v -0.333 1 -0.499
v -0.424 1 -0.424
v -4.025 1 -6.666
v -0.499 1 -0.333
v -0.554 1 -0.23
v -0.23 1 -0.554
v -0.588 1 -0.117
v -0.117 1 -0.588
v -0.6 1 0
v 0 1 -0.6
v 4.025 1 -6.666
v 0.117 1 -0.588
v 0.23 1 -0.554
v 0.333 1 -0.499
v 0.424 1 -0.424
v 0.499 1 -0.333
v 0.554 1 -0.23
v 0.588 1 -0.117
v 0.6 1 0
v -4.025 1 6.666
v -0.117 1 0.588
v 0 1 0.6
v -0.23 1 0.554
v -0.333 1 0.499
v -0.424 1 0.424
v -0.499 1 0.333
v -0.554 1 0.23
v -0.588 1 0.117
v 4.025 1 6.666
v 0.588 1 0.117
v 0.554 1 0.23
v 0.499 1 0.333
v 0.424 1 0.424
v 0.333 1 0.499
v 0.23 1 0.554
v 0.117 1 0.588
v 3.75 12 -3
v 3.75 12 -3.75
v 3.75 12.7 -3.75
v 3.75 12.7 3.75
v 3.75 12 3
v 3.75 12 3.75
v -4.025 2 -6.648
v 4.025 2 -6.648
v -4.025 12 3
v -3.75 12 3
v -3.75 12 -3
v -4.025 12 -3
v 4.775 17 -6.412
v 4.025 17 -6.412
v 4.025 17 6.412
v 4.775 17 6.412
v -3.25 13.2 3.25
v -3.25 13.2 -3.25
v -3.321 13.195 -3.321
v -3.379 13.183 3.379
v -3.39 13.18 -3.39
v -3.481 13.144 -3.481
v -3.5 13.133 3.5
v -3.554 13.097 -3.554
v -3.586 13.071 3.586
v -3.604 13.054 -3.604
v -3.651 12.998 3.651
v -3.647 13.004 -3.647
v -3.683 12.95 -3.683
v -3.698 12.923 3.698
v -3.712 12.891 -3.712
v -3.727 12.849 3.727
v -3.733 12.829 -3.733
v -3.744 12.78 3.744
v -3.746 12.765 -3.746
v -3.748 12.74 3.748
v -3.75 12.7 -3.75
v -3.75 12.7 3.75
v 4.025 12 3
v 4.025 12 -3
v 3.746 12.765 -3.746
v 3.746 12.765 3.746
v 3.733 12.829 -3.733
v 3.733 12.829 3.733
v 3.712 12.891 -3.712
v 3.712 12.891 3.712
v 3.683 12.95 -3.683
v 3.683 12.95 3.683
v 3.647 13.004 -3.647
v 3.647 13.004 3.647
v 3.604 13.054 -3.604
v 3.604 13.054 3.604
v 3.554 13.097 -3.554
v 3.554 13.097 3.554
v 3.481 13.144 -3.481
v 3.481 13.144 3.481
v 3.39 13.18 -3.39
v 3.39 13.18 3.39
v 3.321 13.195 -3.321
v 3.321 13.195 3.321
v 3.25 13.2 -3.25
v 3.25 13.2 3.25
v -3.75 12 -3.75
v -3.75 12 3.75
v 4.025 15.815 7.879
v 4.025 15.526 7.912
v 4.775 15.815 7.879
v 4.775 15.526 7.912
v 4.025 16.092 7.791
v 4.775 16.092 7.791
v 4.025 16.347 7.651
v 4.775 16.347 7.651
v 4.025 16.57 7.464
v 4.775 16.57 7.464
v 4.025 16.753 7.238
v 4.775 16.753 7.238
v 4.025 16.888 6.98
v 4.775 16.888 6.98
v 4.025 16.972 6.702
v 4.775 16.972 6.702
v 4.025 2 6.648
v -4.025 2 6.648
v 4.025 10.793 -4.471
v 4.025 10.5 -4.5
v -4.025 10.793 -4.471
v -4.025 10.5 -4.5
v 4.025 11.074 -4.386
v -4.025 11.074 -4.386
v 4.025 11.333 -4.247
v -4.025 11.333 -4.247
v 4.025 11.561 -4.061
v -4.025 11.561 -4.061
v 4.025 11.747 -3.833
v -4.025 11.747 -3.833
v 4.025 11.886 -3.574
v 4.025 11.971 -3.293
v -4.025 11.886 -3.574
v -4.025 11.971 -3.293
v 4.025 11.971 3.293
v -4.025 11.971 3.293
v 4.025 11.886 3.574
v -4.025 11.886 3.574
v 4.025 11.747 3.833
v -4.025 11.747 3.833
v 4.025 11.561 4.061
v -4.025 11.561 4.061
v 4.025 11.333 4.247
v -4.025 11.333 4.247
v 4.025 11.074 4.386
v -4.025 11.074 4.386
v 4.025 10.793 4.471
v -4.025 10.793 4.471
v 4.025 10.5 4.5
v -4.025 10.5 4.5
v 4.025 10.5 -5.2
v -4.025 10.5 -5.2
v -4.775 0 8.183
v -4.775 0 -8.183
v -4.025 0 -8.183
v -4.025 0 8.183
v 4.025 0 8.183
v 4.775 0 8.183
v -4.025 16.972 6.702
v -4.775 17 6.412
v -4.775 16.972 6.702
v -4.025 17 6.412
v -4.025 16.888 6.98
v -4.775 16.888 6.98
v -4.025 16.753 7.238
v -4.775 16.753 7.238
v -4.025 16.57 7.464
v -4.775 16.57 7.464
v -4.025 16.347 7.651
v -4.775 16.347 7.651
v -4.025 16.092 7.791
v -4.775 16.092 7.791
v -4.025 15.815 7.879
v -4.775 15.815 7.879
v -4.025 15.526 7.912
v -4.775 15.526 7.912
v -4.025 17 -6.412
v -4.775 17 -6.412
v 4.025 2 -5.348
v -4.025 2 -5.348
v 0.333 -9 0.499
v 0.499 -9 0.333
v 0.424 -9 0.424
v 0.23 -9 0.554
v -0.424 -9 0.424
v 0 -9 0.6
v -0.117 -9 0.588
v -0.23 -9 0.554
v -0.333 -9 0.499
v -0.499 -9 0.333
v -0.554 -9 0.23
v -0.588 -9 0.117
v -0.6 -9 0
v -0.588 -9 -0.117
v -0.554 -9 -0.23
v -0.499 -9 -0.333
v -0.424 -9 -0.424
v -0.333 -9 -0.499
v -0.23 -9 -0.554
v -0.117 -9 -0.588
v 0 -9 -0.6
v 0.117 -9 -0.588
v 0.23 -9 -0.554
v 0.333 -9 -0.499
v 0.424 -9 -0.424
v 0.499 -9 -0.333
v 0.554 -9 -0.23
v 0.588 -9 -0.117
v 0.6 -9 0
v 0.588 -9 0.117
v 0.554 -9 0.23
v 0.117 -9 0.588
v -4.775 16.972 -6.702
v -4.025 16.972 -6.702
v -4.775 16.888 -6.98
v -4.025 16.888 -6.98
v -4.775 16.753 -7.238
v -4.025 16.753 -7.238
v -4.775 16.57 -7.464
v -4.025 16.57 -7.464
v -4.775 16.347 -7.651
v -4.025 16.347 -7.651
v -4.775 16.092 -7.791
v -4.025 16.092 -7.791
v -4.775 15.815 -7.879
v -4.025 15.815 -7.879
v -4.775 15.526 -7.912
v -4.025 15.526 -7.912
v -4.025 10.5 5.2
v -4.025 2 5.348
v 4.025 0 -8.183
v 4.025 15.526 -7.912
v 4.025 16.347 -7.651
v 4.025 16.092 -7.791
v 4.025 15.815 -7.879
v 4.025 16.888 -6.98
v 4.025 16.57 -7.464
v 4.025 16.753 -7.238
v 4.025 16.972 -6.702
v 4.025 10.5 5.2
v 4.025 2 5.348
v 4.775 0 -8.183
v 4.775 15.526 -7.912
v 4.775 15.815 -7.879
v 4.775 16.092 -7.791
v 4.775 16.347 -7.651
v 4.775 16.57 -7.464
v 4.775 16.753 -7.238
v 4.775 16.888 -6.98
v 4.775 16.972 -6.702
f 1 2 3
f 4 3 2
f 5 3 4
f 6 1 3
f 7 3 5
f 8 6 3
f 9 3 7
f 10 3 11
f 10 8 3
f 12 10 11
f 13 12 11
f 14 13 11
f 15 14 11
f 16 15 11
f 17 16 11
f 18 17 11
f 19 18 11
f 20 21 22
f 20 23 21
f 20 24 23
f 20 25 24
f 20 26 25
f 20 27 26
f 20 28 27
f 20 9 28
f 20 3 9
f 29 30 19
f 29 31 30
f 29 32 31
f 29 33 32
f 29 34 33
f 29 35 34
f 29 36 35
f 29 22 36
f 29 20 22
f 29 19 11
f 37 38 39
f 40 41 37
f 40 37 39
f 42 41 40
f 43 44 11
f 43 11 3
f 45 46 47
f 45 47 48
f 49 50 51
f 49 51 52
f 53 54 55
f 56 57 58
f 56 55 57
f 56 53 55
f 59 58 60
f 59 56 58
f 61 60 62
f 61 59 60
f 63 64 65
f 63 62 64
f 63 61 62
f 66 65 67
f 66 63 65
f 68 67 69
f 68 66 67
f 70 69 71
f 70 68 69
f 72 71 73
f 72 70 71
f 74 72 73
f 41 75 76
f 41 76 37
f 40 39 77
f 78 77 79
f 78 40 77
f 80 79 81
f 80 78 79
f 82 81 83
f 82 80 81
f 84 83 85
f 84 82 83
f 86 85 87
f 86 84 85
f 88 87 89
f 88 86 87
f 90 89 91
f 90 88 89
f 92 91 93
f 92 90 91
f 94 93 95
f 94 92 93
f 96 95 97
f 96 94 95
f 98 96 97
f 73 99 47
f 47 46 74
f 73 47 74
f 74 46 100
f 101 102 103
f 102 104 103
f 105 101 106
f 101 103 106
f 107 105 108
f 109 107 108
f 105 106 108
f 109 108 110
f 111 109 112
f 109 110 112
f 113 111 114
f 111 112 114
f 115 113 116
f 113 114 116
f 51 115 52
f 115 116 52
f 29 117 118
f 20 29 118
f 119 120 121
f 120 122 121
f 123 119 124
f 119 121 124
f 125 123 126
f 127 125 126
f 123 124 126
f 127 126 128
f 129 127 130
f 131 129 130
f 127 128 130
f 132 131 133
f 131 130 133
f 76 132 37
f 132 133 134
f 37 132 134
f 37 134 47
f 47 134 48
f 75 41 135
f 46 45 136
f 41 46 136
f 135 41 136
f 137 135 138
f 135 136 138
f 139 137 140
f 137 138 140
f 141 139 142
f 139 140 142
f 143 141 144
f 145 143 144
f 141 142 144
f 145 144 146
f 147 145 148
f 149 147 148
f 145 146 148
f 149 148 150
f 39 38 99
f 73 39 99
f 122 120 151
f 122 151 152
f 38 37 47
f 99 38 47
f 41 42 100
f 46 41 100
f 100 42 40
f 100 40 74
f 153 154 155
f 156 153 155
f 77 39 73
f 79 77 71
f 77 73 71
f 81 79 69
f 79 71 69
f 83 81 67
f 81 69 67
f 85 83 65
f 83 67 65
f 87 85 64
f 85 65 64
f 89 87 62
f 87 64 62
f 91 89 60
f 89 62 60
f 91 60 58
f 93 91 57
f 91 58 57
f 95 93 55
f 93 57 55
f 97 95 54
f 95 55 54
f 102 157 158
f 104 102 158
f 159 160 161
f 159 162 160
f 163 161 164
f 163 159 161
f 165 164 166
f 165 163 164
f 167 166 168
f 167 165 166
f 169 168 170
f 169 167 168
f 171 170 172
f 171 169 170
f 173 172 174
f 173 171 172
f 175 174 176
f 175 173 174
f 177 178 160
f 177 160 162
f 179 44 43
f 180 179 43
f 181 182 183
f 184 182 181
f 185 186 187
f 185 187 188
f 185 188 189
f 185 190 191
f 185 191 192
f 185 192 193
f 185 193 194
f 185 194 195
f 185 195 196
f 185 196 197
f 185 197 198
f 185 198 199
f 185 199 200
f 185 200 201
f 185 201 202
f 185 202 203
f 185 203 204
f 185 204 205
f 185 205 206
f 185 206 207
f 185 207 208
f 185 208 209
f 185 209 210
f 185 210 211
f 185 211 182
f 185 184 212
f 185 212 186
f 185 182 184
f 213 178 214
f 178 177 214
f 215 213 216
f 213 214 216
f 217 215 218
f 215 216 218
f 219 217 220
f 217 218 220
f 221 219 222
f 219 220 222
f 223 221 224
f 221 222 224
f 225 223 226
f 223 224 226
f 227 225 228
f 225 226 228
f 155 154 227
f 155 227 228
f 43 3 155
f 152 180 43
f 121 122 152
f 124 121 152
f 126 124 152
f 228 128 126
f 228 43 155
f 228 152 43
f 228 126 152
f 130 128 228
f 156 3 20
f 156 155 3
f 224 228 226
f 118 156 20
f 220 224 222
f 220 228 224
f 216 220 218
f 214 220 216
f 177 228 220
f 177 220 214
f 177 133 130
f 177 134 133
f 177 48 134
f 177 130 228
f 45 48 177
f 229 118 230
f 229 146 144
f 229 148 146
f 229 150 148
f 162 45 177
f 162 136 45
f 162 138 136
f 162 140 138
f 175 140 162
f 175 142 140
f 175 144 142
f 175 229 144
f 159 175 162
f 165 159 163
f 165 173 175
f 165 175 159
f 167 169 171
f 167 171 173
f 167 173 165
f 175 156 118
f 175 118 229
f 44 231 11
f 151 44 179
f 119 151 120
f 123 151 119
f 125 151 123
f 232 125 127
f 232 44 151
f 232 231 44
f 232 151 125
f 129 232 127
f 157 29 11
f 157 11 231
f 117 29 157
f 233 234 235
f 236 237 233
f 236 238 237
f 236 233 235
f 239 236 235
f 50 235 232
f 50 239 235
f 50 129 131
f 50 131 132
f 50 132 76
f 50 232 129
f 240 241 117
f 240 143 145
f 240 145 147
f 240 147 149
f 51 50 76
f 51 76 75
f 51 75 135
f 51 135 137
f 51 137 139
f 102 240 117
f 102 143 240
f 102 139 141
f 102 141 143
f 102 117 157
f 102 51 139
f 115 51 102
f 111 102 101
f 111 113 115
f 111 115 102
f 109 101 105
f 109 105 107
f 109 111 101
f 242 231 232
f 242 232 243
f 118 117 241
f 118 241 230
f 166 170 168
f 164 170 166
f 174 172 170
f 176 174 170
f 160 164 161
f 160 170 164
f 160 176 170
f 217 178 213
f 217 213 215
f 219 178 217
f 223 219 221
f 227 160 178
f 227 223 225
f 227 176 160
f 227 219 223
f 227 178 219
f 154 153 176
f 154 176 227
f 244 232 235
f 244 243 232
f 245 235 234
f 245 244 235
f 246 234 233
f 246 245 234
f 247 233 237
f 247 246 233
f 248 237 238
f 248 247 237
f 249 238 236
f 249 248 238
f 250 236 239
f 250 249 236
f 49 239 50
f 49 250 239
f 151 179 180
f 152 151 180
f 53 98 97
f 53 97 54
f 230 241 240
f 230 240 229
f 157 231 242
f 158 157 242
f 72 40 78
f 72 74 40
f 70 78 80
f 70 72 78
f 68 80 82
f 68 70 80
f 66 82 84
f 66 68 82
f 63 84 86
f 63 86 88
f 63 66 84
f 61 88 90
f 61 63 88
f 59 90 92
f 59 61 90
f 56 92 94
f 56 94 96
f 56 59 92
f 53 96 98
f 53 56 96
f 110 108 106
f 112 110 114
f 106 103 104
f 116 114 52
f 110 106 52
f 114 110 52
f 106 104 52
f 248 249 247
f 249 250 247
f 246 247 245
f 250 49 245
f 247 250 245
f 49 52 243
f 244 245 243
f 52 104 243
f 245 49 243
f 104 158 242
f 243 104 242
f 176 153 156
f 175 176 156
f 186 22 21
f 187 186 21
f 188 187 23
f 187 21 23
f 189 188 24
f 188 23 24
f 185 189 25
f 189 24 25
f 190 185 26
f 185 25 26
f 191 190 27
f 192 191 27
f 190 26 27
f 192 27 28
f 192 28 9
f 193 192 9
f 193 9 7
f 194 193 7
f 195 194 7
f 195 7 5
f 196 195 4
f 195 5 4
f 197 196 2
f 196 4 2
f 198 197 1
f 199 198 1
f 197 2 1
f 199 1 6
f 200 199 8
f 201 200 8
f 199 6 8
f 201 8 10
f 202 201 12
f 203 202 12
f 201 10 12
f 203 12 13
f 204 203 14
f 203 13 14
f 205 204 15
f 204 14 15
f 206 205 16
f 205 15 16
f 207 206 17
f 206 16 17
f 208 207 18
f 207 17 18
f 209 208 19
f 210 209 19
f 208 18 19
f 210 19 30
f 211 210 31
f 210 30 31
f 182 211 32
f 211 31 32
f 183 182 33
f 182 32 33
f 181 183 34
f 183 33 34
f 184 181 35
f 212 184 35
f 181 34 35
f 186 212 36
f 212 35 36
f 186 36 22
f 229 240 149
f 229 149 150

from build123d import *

# Parameters (mm, degrees)
SKETCH_1_W          = 9.55
SKETCH_1_H          = 16
EXTRUDE_1_DEPTH     = 17
SKETCH_2_W          = 8.05
SKETCH_2_H          = 16
CUT_EXTRUDE_1_DEPTH = 6.5
SKETCH_5_W          = 8.05
SKETCH_5_H          = 8.5
CUT_EXTRUDE_4_DEPTH = 2.8
SKETCH_6_W          = 8.05
SKETCH_6_H          = 2
CUT_EXTRUDE_5_DEPTH = 1.5
DRAFT_1_ANGLE       = 1
SKETCH_7_W          = 8.05
SKETCH_7_H          = 13.366556364
CUT_EXTRUDE_6_DEPTH = 1
FILLET_1_R          = 1.5
SKETCH_8_W          = 8.05
SKETCH_8_H          = 9
EXTRUDE_1747_DEPTH  = 1.5
SKETCH_9_R          = 0.6
EXTRUDE_3_DEPTH     = 10
FILLET_2_R          = 1.5
SKETCH_10_W         = 7.5
SKETCH_10_H         = 7.5
EXTRUDE_4_DEPTH     = 1.2
FILLET_4_R          = 0.5


with BuildPart() as part:
    # 草图1 → 拉伸1 (new body)
    with BuildSketch(Plane(origin=(0, 0, 0), x_dir=(1, 0, 0), z_dir=(0, 1, 0))):
        Rectangle(SKETCH_1_W, SKETCH_1_H)
    extrude(amount=EXTRUDE_1_DEPTH)

    # 草图2 → 切除-拉伸1 (cut)
    with BuildSketch(Plane(origin=(0, 17, 0), x_dir=(-1, 0, 0), z_dir=(0, 1, 0))):
        Rectangle(SKETCH_2_W, SKETCH_2_H)
    extrude(amount=-CUT_EXTRUDE_1_DEPTH, mode=Mode.SUBTRACT)

    # 草图5 → 切除-拉伸4 (cut)
    with BuildSketch(Plane(origin=(0, 0, -8), x_dir=(-1, 0, 0), z_dir=(0, 0, -1))):
        with Locations((0, 6.25)):
            Rectangle(SKETCH_5_W, SKETCH_5_H)
    cut_extrude_4 = extrude(amount=-CUT_EXTRUDE_4_DEPTH, mode=Mode.SUBTRACT)

    # 草图6 → 切除-拉伸5 (cut)
    with BuildSketch(Plane(origin=(0, 0, -8), x_dir=(-1, 0, 0), z_dir=(0, 0, -1))):
        with Locations((0, 1)):
            Rectangle(SKETCH_6_W, SKETCH_6_H)
    cut_extrude_5 = extrude(amount=-CUT_EXTRUDE_5_DEPTH, mode=Mode.SUBTRACT)

    # 镜向3: 切除-拉伸4, 切除-拉伸5 across plane
    add(cut_extrude_4.mirror(Plane.XY), mode=Mode.SUBTRACT)
    add(cut_extrude_5.mirror(Plane.XY), mode=Mode.SUBTRACT)

    # 拔模1
    draft_1_faces = [part.faces().sort_by_distance(p)[0] for p in [
        (4.4, 8.5, 8),
        (-4.4, 8.5, 8),
        (0, 1, 6.5),
        (0, 6.25, 5.2),
        (0, 1, -6.5),
        (-4.4, 8.5, -8),
        (0, 6.25, -5.2),
        (4.4, 8.5, -8),
    ]]
    draft(draft_1_faces, Plane(origin=(4.025, 10.5, -8), x_dir=(0, 0, 1), z_dir=(0, 1, 0)), DRAFT_1_ANGLE)

    # 草图7 → 切除-拉伸6 (cut)
    with BuildSketch(Plane.XZ):
        Rectangle(SKETCH_7_W, SKETCH_7_H)
    extrude(amount=-CUT_EXTRUDE_6_DEPTH, mode=Mode.SUBTRACT)

    # 圆角1
    fillet_1_edges = [part.edges().sort_by_distance(p)[0] for p in [
        (4.4, 17, -7.886542078),
        (4.4, 17, 7.886542078),
        (-4.4, 17, -7.886542078),
        (-4.4, 17, 7.886542078),
    ]]
    fillet(fillet_1_edges, radius=FILLET_1_R)

    # 草图8 → Extrude 1747 (add)
    with BuildSketch(Plane(origin=(0, 10.5, 0), x_dir=(-1, 0, 0), z_dir=(0, 1, 0))):
        Rectangle(SKETCH_8_W, SKETCH_8_H)
    extrude(amount=EXTRUDE_1747_DEPTH)

    # 草图9 → 拉伸3 (add)
    with BuildSketch(Plane.XZ.offset(-1)):
        with Locations(Location((0, 0, 0), (0, 0, 90))):
            Circle(SKETCH_9_R)
    extrude(amount=EXTRUDE_3_DEPTH)

    # 圆角2
    fillet_2_edges = [part.edges().sort_by_distance(p)[0] for p in [
        (0, 12, -4.5),
        (0, 12, 4.5),
    ]]
    fillet(fillet_2_edges, radius=FILLET_2_R - 0.0001)  # a hair under: the kernel refuses the full size

    # 草图10 → 拉伸4 (add)
    with BuildSketch(Plane(origin=(0, 12, 0), x_dir=(-1, 0, 0), z_dir=(0, 1, 0))):
        Rectangle(SKETCH_10_W, SKETCH_10_H)
    extrude(amount=EXTRUDE_4_DEPTH)

    # 圆角4
    fillet_4_edges = [part.edges().sort_by_distance(p)[0] for p in [
        (3.75, 13.2, 0),
        (0, 13.2, -3.75),
        (-3.75, 13.2, 0),
        (0, 13.2, 3.75),
    ]]
    fillet(fillet_4_edges, radius=FILLET_4_R)


solid = part.part
